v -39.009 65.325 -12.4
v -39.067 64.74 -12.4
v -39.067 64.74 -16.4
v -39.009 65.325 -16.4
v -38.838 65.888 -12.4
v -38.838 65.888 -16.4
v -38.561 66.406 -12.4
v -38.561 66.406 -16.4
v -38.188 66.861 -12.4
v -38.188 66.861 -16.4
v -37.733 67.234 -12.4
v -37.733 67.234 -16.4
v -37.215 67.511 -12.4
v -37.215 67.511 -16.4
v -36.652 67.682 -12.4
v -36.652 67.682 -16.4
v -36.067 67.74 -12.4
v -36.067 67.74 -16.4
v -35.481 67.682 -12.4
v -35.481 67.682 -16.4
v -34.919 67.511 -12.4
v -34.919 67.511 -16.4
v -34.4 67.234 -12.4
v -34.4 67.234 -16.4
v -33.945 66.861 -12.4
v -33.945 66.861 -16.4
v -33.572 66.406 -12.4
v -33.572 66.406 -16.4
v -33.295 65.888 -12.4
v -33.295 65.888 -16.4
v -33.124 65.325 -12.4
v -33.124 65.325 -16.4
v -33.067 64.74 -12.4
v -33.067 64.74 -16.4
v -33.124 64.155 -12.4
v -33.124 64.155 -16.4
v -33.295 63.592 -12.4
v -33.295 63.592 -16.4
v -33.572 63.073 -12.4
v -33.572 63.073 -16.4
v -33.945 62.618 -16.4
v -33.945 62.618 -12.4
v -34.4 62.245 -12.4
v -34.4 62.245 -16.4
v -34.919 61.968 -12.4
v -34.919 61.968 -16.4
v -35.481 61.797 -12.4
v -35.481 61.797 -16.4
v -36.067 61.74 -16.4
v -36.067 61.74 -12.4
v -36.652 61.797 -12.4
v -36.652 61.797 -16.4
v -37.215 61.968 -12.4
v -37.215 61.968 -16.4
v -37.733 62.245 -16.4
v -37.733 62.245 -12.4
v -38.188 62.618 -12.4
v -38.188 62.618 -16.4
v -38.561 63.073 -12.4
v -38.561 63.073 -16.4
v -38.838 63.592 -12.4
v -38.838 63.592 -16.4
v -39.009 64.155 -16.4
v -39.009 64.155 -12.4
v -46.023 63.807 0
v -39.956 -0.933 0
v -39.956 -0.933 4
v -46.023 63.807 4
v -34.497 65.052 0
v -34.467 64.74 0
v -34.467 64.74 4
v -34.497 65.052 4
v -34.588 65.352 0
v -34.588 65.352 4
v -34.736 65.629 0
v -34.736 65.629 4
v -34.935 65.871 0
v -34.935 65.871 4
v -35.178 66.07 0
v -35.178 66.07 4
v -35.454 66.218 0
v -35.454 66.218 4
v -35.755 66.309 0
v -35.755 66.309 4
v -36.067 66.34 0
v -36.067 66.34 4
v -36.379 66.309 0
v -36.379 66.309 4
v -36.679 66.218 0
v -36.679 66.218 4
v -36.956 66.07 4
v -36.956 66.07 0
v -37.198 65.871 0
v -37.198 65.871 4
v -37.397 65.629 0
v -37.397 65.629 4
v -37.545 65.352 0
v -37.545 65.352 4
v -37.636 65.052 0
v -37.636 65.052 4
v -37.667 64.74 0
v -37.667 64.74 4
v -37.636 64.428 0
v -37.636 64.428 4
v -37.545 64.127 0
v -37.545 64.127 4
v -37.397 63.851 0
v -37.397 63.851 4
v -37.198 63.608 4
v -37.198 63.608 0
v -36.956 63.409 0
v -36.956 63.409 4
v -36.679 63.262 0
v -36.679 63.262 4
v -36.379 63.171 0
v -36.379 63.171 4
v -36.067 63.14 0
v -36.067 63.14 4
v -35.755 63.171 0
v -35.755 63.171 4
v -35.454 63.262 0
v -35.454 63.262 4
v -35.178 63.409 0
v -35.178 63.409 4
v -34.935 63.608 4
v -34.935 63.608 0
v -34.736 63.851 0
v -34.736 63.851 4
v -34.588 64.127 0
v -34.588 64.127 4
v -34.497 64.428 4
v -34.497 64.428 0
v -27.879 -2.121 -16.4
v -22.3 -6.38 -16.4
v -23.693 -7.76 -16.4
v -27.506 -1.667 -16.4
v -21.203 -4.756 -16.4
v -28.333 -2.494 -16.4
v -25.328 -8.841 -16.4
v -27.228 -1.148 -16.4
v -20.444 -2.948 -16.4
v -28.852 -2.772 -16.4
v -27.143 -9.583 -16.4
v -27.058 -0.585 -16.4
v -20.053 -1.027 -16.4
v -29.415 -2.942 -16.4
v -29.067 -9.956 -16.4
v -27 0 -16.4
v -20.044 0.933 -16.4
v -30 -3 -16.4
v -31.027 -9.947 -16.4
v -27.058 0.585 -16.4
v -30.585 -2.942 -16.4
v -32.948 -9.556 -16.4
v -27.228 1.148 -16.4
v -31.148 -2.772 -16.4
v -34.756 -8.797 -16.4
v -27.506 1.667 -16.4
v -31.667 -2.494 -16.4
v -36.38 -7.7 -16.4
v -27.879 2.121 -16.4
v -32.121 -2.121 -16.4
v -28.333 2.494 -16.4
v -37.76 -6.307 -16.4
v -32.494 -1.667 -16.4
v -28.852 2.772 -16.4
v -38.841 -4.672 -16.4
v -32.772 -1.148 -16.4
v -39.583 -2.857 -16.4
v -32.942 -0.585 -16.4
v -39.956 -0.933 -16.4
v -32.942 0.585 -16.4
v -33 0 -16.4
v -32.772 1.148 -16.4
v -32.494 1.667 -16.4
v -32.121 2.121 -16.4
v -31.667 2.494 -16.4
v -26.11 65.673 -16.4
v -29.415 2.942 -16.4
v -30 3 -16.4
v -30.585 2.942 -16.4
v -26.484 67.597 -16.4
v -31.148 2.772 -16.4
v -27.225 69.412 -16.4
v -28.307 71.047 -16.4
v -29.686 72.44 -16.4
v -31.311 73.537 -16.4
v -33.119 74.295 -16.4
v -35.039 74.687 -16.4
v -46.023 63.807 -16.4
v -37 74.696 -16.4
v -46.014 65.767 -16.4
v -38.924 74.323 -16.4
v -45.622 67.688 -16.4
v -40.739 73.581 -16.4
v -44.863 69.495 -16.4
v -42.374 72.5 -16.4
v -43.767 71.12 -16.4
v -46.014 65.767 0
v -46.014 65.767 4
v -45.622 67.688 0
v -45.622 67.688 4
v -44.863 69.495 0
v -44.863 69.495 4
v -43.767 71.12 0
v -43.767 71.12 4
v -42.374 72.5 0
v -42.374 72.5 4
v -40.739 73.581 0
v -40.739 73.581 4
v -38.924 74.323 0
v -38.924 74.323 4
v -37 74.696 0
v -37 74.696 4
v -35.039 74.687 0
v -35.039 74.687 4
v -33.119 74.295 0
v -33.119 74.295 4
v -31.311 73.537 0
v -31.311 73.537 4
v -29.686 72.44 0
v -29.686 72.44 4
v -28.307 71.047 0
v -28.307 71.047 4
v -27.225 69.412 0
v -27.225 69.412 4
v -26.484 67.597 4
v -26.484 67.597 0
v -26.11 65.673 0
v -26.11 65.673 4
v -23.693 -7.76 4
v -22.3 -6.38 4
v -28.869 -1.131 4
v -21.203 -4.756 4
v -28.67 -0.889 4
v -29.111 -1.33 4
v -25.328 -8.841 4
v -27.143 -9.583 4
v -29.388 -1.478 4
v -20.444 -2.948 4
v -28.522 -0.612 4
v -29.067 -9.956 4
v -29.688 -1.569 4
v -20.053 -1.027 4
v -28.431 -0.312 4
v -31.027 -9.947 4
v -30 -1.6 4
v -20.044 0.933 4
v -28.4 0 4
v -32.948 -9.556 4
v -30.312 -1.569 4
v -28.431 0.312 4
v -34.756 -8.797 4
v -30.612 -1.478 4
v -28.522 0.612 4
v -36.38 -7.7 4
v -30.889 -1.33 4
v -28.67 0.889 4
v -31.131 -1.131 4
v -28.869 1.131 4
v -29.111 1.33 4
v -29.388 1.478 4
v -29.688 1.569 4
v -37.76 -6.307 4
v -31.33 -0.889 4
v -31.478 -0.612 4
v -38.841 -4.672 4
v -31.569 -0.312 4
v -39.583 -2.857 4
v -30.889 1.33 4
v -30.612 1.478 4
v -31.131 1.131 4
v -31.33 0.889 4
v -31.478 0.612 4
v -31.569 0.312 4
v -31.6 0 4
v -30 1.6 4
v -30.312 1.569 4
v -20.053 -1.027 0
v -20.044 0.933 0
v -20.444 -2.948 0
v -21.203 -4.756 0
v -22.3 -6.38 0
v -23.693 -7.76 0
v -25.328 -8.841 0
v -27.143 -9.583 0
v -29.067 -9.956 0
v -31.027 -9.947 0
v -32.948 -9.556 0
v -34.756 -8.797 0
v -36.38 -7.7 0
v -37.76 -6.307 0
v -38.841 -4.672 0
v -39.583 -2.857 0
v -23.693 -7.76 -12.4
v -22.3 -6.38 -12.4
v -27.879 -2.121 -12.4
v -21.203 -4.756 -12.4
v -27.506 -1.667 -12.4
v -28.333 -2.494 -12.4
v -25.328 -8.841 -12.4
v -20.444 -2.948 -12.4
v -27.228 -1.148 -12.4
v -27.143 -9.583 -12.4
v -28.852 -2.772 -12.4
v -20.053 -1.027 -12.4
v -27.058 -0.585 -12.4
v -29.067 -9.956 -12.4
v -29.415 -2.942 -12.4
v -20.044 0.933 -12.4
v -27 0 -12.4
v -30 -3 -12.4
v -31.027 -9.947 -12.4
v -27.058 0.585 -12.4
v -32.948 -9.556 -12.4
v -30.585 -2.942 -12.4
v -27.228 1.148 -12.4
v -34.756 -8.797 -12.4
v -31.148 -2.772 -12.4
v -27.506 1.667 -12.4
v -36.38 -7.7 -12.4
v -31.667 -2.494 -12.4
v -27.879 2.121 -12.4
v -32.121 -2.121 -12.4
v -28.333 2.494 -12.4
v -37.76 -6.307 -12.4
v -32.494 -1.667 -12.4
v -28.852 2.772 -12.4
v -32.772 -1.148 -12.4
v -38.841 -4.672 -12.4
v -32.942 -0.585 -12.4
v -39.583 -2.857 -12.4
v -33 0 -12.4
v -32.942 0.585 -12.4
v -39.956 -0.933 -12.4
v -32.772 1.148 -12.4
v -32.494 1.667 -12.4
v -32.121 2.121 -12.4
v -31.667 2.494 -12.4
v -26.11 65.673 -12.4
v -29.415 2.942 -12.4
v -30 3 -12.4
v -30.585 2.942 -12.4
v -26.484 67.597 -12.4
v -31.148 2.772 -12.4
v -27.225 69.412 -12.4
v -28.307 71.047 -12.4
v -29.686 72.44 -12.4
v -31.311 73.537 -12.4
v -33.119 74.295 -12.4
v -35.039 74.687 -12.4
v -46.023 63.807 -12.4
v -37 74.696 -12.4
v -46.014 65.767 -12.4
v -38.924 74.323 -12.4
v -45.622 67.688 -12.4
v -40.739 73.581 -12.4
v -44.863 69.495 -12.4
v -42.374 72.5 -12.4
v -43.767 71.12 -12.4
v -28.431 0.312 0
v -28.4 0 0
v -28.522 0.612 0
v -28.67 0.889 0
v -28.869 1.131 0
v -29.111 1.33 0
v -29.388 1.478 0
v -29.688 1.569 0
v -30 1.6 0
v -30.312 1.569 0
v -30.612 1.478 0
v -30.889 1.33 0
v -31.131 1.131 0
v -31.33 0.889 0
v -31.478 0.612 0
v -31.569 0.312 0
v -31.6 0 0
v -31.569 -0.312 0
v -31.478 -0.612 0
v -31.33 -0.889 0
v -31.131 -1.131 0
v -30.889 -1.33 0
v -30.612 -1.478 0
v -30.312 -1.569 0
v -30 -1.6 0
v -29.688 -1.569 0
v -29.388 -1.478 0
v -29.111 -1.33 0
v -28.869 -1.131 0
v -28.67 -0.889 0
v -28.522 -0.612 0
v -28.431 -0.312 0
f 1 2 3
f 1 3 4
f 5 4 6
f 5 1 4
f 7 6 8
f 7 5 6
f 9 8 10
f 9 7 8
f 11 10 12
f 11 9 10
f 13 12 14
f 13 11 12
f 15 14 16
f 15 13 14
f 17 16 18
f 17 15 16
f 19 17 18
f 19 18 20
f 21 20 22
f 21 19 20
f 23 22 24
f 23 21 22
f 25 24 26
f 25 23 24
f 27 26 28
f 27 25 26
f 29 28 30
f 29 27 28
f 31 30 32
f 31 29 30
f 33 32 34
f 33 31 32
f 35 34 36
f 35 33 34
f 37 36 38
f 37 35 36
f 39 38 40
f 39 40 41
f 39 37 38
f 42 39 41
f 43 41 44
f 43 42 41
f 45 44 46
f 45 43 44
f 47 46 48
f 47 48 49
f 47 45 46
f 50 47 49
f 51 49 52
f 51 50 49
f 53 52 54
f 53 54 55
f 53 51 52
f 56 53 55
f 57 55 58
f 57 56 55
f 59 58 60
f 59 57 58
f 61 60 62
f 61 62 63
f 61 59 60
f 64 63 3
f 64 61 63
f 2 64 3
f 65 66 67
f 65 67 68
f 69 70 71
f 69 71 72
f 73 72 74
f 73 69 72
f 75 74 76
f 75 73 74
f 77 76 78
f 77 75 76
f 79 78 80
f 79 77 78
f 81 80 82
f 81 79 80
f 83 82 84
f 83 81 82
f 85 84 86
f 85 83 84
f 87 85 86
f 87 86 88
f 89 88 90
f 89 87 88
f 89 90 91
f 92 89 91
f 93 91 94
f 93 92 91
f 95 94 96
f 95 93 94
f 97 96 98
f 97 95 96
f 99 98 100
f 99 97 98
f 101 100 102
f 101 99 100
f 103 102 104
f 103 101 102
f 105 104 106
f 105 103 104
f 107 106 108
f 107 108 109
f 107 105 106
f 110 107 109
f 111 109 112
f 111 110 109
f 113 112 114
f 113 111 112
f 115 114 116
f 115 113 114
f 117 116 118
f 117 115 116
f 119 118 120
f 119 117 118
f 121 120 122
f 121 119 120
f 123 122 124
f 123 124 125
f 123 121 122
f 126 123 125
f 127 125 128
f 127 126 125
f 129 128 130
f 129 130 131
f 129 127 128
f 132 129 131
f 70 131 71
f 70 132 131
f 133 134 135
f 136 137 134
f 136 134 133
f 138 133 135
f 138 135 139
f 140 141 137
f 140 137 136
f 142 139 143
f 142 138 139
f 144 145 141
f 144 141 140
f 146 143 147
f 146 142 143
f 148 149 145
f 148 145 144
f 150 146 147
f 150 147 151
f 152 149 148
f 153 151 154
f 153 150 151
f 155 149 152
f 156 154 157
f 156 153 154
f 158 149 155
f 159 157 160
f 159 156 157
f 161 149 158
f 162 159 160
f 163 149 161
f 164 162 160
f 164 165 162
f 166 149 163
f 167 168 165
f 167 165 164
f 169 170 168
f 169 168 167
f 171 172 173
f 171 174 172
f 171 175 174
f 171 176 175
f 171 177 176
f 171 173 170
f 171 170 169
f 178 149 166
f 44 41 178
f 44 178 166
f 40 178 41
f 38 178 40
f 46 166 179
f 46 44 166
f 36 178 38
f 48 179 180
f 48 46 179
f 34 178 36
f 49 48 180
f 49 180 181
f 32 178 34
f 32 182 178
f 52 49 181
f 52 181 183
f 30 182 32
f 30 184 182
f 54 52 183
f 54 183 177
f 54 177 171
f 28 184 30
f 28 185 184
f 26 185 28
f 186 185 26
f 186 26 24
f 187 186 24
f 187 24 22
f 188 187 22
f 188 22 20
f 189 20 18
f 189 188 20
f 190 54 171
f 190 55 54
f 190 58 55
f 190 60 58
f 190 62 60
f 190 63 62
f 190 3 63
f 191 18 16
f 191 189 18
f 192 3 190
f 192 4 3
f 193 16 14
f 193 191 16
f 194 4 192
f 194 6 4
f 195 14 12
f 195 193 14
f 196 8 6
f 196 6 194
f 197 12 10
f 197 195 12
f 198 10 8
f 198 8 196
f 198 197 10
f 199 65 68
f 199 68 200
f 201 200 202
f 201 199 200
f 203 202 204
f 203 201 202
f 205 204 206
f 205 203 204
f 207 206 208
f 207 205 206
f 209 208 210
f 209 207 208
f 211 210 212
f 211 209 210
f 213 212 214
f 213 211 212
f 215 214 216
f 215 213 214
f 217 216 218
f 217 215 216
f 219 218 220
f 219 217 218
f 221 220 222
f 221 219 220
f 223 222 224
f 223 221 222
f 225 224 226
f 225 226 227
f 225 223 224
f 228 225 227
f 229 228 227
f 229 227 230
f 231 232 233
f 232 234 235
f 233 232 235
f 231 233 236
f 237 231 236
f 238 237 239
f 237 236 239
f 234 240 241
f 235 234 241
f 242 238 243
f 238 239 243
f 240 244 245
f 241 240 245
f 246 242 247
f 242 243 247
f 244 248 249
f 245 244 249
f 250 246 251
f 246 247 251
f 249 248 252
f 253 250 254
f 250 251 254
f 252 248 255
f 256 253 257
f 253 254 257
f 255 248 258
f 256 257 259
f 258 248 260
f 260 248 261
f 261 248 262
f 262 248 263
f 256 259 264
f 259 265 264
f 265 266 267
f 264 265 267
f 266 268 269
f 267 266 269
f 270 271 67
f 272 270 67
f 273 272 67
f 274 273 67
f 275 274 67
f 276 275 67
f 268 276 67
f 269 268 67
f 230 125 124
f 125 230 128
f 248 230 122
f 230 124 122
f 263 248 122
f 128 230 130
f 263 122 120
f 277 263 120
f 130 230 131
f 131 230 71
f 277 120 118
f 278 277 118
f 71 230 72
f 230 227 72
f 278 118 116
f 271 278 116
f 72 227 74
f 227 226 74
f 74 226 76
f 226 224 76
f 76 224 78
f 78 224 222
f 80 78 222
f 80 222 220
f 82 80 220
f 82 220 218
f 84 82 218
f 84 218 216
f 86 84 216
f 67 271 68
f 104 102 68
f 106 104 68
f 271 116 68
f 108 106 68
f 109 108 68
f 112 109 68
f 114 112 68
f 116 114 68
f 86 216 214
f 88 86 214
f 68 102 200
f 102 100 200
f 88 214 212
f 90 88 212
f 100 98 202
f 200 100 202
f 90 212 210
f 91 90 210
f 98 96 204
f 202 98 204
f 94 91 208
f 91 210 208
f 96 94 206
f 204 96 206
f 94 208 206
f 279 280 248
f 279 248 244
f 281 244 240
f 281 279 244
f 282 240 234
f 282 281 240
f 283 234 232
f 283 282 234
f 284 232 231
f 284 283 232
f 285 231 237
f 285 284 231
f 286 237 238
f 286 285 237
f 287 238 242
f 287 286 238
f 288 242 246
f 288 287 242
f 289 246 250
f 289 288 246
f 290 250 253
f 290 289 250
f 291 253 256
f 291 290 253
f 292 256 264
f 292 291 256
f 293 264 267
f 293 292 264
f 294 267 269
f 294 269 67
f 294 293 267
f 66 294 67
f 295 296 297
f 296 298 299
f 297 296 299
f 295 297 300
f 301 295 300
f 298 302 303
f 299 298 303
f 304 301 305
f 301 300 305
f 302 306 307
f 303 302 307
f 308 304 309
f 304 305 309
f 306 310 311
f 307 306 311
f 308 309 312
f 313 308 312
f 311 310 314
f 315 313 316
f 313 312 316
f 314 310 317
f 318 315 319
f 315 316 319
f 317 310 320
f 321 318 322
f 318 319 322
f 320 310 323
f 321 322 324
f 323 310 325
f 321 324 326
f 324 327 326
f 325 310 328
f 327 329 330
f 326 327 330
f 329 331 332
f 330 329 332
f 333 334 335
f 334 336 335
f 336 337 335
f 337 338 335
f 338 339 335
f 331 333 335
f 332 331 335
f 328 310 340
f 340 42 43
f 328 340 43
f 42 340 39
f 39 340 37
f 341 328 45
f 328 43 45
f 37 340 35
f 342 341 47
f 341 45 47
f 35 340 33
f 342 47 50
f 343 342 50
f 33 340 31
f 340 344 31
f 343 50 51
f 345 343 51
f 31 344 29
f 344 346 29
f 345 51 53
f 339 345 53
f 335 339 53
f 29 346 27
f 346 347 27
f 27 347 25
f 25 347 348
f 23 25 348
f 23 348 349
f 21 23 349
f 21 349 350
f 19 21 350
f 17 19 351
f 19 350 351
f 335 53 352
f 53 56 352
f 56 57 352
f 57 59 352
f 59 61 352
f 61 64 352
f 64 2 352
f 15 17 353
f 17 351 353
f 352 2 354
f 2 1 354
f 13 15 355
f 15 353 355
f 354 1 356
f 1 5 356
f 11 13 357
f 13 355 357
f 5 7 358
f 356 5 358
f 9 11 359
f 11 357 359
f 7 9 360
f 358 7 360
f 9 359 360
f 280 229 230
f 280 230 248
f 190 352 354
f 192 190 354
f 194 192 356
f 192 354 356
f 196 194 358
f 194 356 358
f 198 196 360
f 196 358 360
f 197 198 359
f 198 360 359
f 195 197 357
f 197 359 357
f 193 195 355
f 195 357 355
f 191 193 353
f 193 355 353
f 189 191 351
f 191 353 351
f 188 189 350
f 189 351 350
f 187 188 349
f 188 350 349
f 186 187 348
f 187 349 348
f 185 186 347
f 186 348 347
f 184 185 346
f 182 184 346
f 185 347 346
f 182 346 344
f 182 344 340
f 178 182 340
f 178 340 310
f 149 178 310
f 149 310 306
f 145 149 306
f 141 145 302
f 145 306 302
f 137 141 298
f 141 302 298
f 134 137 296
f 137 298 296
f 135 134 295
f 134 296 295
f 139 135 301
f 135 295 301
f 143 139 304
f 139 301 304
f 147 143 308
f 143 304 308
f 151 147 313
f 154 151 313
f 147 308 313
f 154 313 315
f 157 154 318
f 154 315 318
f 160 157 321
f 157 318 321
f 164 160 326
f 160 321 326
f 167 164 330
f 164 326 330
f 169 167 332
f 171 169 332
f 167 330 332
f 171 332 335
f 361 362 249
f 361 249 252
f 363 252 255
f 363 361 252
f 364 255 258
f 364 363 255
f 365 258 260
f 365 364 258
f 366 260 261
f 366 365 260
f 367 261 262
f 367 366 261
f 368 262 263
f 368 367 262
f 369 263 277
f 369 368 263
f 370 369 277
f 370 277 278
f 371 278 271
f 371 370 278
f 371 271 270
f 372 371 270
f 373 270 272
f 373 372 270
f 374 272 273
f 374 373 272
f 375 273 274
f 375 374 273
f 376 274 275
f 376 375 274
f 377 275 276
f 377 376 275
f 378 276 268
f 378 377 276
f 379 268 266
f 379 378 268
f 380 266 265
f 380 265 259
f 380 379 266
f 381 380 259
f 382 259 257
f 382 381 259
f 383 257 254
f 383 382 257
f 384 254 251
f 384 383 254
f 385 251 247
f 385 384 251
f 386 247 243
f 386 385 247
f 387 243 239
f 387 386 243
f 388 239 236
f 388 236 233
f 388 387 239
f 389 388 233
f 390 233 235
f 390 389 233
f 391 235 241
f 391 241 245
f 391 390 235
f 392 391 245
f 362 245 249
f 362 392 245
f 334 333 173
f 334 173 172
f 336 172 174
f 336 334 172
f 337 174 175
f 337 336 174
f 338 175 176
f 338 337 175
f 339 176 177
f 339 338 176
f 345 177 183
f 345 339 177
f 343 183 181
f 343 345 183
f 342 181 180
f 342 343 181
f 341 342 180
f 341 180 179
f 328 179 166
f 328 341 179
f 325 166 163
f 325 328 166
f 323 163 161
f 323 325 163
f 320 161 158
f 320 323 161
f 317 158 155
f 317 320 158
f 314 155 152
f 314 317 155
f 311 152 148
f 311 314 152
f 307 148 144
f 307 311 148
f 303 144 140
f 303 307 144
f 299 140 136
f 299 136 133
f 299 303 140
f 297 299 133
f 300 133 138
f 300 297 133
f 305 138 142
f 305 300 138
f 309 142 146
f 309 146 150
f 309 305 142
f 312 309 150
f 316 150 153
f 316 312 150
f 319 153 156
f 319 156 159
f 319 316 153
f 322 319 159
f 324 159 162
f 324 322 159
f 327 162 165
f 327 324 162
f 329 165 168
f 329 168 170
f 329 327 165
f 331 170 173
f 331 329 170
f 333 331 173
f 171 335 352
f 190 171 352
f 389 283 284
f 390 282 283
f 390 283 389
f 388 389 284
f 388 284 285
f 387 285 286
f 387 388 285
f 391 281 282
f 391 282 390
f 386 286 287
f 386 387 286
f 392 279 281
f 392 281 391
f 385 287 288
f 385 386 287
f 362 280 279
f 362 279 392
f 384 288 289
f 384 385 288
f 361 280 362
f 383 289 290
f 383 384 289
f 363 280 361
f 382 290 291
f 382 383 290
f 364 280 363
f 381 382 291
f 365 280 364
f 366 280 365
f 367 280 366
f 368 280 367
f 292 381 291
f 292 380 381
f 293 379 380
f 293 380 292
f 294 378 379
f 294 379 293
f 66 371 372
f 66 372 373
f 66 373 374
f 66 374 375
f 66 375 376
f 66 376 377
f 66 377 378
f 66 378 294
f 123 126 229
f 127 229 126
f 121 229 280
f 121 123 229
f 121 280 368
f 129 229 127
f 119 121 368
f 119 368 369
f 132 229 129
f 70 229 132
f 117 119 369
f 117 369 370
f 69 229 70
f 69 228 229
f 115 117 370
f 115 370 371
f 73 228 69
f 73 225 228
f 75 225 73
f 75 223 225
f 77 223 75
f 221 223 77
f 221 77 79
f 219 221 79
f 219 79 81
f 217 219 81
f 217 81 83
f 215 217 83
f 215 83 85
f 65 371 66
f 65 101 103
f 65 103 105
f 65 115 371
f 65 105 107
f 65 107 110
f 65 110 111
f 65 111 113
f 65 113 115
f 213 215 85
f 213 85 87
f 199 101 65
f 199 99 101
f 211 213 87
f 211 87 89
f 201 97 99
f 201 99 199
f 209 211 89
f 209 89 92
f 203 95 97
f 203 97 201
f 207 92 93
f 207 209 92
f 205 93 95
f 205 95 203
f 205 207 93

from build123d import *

# Parameters (mm, degrees)
SKETCH_1_R      = 1.6
EXTRUDE_1_DEPTH = 4
SKETCH_3_R      = 3
EXTRUDE_2_DEPTH = 4


with BuildPart() as part:
    # ｽｹｯﾁ1 → ﾎﾞｽ - 押し出し1 (new body)
    with BuildSketch(Plane.XY):
        with BuildLine():
            Line((-26.110299196, 65.672781916), (-20.043619517, 0.932999289))
            ThreePointArc((-20.043619517, 0.932999289), (-29.067000711, -9.956380483), (-39.956380483, -0.932999289))
            Line((-39.956380483, -0.932999289), (-46.023060163, 63.806783338))
            ThreePointArc((-46.023060163, 63.806783338), (-36.999678969, 74.69616311), (-26.110299196, 65.672781916))
        make_face()
        with Locations((-36.06667968, 64.739782627)):
            Circle(SKETCH_1_R, mode=Mode.SUBTRACT)
        with Locations((-30, 0)):
            Circle(SKETCH_1_R, mode=Mode.SUBTRACT)
    extrude(amount=EXTRUDE_1_DEPTH)


with BuildPart() as body_2:
    # ｽｹｯﾁ3 → ﾎﾞｽ - 押し出し2 (new body)
    with BuildSketch(Plane(origin=(0, 0, -12.4), x_dir=(-1, 0, 0), z_dir=(0, 0, -1))):
        with BuildLine():
            Line((26.110299196, 65.672781916), (20.043619517, 0.932999289))
            ThreePointArc((20.043619517, 0.932999289), (29.067000711, -9.956380483), (39.956380483, -0.932999289))
            Line((39.956380483, -0.932999289), (46.023060163, 63.806783338))
            ThreePointArc((46.023060163, 63.806783338), (36.999678969, 74.69616311), (26.110299196, 65.672781916))
        make_face()
        with Locations((30, 0)):
            Circle(SKETCH_3_R, mode=Mode.SUBTRACT)
        with Locations((36.06667968, 64.739782627)):
            Circle(SKETCH_3_R, mode=Mode.SUBTRACT)
    extrude(amount=EXTRUDE_2_DEPTH)


solid = Compound([part.part, body_2.part])
